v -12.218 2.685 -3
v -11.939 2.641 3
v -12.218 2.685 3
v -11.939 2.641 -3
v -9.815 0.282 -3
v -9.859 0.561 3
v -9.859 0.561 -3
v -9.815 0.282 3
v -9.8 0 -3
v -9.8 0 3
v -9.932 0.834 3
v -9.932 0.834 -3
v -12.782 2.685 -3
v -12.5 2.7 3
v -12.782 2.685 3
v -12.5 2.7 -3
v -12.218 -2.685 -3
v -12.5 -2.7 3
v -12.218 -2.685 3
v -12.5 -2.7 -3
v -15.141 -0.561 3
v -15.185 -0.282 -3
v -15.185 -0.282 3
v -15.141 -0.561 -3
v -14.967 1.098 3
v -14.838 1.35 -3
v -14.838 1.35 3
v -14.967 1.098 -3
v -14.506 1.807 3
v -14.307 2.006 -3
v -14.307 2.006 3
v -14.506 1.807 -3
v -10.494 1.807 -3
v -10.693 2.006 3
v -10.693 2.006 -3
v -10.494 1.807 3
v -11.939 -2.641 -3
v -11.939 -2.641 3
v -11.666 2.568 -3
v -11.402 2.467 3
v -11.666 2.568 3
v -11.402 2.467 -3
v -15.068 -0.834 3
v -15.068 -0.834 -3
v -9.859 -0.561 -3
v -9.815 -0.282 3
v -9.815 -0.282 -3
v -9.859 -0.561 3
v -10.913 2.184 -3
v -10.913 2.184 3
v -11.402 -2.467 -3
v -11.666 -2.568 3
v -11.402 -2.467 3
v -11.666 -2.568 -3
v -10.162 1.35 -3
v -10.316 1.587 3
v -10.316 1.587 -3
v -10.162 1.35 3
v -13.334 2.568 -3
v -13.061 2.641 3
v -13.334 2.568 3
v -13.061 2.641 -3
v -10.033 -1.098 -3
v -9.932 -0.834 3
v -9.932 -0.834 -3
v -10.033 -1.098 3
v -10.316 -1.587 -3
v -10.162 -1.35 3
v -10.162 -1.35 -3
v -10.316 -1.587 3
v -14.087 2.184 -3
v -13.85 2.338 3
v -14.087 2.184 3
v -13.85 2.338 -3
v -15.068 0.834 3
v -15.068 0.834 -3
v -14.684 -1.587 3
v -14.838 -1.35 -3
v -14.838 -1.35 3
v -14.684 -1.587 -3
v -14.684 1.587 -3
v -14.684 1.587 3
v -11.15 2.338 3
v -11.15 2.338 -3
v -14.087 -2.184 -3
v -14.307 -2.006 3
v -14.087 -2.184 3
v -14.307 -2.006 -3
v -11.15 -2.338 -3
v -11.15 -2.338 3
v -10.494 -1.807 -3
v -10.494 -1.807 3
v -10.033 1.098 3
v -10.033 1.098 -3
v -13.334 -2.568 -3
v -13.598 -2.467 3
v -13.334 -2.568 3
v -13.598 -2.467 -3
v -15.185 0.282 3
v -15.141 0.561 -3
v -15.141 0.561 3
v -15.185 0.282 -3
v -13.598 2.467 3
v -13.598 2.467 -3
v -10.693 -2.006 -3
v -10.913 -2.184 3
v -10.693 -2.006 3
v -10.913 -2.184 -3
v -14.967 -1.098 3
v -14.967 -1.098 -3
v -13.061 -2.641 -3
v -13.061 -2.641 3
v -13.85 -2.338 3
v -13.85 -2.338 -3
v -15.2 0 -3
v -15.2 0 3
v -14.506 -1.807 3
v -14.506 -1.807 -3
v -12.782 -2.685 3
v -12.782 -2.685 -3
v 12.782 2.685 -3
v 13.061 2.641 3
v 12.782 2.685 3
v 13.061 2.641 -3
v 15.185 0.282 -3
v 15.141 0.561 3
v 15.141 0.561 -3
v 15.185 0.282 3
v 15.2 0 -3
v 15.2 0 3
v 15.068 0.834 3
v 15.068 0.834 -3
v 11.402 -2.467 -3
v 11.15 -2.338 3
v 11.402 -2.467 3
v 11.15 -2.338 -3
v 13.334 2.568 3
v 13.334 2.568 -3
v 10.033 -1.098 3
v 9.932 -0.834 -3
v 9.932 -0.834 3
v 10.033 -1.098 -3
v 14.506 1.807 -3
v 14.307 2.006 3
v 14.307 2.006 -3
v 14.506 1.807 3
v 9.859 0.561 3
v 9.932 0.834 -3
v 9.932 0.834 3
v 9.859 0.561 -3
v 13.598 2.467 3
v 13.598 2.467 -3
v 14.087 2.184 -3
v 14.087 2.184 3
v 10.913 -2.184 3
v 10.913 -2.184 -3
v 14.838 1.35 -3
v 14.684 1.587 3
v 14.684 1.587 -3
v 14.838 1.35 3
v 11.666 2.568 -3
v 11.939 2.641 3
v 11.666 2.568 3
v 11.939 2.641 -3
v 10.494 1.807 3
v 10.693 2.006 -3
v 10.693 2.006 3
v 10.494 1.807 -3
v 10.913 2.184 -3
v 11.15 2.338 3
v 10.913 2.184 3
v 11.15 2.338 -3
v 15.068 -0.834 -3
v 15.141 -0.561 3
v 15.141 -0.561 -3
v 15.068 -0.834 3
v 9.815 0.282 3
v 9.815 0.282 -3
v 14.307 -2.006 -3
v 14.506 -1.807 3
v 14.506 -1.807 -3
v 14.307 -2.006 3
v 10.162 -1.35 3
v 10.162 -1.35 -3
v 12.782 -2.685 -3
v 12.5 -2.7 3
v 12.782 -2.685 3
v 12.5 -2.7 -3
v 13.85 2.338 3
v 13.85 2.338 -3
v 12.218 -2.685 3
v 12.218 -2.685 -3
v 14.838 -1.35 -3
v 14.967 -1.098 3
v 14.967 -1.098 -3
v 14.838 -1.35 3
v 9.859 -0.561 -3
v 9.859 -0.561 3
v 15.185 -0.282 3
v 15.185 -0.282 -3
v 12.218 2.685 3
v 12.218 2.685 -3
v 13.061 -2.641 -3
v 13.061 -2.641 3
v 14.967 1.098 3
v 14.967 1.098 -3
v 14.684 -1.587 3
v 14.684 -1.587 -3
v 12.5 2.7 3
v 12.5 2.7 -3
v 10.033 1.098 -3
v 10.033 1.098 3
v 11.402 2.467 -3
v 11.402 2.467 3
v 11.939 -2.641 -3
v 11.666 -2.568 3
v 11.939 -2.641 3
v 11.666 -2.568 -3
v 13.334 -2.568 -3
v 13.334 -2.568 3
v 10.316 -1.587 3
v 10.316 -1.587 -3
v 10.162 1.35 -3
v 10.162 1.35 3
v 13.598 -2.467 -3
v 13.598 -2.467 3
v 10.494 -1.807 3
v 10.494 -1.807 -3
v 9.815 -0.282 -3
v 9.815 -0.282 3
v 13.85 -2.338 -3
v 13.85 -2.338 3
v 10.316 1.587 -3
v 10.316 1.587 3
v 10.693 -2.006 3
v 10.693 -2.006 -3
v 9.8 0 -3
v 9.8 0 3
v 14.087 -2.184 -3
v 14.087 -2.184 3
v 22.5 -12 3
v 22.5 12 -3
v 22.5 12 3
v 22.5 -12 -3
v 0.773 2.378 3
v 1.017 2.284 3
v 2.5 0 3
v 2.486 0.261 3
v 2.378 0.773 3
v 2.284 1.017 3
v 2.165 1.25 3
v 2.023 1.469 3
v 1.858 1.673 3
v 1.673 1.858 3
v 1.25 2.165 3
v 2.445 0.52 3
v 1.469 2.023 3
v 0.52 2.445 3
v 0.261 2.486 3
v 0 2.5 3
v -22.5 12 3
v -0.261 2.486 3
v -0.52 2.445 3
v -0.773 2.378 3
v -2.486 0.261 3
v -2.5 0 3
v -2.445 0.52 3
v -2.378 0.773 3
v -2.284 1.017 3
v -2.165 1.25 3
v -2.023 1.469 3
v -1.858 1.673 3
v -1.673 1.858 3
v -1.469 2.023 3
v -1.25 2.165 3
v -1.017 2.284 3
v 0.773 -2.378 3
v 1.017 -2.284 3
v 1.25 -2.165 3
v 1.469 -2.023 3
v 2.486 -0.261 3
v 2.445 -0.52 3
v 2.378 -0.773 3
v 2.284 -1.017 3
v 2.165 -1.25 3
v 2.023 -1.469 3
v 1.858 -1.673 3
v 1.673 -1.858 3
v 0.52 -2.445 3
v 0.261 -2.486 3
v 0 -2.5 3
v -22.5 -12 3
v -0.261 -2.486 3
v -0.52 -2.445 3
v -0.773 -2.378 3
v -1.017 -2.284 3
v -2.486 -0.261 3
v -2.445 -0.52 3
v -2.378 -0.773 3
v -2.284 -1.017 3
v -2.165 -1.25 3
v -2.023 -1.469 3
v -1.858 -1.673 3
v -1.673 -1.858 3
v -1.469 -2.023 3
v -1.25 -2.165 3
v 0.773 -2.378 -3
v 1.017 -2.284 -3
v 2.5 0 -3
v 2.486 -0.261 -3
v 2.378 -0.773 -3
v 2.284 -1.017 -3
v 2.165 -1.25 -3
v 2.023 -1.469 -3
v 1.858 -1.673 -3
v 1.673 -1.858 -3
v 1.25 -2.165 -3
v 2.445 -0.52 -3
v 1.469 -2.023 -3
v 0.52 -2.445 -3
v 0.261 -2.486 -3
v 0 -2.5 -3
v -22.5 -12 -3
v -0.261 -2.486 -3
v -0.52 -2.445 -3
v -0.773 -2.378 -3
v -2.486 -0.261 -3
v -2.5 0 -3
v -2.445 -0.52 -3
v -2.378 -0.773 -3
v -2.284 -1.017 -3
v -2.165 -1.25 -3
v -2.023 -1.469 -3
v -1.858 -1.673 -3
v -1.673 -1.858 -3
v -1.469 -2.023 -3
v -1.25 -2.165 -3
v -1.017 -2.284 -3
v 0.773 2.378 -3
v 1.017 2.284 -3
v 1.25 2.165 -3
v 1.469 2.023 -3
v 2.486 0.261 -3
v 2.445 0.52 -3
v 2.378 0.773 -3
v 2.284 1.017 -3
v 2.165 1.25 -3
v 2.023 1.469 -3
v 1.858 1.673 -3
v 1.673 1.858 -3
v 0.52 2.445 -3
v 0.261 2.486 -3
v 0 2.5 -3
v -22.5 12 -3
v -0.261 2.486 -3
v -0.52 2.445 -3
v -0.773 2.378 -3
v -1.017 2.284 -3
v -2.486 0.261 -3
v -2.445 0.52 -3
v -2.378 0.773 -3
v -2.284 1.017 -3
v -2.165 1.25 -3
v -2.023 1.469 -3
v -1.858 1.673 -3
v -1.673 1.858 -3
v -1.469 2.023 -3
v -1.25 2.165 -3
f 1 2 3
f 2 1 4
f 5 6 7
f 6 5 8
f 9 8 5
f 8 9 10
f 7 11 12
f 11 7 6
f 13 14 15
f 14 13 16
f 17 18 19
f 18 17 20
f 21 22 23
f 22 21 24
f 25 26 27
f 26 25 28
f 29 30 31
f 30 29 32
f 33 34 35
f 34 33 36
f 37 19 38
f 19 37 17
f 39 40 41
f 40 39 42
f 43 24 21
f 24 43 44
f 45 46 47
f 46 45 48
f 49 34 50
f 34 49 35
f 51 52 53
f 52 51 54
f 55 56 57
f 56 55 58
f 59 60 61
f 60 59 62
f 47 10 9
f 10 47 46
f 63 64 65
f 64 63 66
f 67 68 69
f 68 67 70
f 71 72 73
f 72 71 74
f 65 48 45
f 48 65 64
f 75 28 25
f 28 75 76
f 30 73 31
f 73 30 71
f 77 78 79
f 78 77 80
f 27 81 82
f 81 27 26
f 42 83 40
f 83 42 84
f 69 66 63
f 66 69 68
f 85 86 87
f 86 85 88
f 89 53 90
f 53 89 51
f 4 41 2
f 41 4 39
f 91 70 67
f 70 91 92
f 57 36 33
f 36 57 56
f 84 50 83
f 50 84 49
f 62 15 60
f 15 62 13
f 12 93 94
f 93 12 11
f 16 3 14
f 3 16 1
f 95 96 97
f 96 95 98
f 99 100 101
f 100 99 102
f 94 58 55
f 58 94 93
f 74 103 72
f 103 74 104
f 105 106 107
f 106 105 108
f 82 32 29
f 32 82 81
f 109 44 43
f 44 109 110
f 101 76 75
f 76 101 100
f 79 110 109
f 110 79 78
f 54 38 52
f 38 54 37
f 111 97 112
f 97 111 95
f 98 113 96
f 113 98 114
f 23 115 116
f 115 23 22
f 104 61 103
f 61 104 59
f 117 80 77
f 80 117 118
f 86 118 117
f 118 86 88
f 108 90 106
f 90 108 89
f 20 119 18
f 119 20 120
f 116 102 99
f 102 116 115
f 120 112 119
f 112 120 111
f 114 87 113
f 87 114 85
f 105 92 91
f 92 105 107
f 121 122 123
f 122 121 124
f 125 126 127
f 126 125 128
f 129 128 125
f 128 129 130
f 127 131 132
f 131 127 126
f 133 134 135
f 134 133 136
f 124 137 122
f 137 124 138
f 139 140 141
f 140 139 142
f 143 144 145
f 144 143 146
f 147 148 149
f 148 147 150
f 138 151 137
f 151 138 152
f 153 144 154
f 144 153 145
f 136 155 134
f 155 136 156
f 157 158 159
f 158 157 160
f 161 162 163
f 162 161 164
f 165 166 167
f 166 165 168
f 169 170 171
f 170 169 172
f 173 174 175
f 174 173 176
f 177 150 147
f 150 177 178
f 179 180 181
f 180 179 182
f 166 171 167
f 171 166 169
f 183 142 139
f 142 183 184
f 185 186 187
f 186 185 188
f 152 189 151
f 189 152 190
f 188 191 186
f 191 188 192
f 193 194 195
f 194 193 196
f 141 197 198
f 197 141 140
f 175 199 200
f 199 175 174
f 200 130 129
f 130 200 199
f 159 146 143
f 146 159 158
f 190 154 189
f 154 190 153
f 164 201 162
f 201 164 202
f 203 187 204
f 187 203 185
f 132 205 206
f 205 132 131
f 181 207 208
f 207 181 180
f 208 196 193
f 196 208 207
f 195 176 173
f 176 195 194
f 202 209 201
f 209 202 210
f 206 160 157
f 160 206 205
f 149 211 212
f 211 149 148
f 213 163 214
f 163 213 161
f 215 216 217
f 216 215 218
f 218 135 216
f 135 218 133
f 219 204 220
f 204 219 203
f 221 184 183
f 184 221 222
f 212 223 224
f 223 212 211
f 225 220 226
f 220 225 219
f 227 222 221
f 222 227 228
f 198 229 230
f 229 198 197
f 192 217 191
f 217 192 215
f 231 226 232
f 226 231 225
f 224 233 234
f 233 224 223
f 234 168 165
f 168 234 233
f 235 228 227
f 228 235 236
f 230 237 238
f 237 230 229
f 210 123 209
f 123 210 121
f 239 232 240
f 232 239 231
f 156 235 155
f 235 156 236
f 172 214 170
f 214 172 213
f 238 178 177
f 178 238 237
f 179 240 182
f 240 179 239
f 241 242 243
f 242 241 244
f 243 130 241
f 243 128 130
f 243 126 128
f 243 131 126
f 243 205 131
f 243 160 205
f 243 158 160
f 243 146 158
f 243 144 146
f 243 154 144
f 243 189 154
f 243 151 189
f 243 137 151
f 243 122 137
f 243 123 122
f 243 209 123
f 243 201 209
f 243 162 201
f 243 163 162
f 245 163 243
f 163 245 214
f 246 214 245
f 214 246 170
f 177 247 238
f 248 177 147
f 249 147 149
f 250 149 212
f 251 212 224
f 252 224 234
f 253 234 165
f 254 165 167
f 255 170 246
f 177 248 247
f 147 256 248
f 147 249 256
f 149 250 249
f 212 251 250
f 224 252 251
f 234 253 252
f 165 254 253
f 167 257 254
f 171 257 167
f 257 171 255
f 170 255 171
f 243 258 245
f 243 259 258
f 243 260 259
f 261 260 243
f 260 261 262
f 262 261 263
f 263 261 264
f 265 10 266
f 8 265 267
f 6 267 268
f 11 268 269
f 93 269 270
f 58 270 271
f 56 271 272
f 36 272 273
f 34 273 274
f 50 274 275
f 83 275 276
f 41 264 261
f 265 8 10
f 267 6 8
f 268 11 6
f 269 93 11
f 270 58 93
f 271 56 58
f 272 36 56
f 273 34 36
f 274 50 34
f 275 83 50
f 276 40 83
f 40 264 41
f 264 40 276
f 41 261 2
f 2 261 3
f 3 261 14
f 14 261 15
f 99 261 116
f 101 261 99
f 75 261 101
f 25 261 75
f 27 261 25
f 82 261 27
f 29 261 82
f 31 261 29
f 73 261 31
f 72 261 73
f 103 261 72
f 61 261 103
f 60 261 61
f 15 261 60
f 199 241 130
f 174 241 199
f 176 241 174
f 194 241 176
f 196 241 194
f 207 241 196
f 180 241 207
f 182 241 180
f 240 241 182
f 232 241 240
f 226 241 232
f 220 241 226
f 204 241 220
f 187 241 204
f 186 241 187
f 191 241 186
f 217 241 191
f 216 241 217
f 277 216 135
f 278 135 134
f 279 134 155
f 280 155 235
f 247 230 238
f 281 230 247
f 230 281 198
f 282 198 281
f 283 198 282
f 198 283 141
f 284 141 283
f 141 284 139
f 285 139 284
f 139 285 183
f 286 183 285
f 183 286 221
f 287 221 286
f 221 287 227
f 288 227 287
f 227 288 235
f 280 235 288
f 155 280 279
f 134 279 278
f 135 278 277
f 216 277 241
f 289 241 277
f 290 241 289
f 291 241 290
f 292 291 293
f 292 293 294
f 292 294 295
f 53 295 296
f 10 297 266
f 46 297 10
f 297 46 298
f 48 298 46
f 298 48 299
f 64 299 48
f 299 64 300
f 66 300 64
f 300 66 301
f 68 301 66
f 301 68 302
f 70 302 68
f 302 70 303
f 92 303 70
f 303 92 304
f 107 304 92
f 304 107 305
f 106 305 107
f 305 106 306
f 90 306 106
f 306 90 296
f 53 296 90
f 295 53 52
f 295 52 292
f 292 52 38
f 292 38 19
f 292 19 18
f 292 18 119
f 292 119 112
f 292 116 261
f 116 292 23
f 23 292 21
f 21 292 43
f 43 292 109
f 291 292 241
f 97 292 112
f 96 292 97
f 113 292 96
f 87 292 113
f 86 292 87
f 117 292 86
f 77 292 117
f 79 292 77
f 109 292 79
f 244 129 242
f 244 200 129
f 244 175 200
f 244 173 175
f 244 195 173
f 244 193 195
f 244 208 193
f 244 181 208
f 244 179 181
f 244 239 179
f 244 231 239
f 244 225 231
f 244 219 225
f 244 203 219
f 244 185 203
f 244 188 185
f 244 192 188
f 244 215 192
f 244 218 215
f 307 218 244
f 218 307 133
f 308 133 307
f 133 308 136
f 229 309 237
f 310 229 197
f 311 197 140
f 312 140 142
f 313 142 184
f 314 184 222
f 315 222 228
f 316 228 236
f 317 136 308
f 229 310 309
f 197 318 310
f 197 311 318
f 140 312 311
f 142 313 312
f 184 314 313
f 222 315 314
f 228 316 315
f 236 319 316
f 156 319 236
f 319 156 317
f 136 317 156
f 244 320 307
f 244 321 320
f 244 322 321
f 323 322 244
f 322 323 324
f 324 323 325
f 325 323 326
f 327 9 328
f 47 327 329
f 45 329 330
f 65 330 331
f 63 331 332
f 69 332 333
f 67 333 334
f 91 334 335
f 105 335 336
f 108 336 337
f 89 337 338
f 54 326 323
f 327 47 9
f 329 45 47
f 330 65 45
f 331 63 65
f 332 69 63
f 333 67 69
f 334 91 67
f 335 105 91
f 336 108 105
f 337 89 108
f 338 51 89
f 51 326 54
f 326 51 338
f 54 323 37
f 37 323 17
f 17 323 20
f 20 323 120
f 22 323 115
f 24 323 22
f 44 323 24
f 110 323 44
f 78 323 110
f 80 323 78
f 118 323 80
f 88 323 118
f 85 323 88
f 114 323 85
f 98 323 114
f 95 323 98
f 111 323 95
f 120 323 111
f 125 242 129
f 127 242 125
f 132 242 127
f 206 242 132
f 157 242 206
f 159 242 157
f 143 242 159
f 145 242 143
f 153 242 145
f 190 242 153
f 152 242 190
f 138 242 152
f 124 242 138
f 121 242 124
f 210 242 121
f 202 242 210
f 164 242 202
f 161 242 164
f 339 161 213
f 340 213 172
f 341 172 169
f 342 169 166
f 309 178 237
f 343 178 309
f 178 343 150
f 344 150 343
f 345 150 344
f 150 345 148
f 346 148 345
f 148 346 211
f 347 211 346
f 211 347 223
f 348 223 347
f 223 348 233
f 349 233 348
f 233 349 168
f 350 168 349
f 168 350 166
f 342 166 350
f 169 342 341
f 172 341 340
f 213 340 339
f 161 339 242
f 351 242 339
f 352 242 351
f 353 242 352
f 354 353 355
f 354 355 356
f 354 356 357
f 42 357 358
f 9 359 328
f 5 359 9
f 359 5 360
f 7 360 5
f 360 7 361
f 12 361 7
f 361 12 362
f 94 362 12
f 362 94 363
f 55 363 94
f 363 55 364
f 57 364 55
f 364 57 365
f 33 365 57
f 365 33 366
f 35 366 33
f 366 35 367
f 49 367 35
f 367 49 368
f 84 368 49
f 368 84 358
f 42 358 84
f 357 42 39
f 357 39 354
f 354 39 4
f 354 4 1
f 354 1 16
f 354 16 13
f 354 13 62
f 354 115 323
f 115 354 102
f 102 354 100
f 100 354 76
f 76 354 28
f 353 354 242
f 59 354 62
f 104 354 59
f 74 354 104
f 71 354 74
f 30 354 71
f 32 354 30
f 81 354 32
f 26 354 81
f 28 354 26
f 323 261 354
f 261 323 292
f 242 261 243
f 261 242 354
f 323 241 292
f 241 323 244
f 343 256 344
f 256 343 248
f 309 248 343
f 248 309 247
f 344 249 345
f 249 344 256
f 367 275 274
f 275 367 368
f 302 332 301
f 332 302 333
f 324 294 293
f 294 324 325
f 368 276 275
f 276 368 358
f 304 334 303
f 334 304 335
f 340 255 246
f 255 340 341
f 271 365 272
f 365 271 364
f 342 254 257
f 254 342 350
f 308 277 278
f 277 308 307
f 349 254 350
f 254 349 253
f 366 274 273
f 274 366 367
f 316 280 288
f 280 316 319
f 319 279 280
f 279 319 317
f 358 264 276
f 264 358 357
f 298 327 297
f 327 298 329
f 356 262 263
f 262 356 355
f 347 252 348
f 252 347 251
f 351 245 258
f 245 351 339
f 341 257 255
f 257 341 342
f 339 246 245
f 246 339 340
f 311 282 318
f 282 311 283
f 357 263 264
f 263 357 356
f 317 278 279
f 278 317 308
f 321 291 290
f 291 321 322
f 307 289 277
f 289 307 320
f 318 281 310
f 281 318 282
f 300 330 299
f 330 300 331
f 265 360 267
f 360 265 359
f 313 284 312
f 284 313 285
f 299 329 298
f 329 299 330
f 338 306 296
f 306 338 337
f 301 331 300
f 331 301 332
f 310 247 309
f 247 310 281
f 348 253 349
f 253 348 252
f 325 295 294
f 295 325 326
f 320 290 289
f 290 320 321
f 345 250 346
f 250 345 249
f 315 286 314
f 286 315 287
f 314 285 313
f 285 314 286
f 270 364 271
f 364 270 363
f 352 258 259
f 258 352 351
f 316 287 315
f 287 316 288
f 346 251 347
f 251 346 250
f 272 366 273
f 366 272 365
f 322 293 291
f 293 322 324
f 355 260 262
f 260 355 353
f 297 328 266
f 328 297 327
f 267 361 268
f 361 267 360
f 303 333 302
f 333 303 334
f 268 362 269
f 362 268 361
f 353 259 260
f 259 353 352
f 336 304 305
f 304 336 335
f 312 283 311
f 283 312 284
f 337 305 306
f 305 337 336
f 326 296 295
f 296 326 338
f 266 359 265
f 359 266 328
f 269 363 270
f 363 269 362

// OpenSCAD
// Rod-end mounting plate.
$fn = 60;
eps = 0.02;
plate_l = 45;
plate_w = 24;
plate_t = 6;
bore_d = 5;
difference() {
    cube([plate_l, plate_w, plate_t], center = true);
    translate([0, 0, -plate_t / 2 - eps]) cylinder(d = bore_d, h = plate_t + 2 * eps);
    for (x = [-plate_l / 2 + 10, plate_l / 2 - 10])
        translate([x, 0, -plate_t / 2 - eps]) cylinder(d = 5.4, h = plate_t + 2 * eps);
}
